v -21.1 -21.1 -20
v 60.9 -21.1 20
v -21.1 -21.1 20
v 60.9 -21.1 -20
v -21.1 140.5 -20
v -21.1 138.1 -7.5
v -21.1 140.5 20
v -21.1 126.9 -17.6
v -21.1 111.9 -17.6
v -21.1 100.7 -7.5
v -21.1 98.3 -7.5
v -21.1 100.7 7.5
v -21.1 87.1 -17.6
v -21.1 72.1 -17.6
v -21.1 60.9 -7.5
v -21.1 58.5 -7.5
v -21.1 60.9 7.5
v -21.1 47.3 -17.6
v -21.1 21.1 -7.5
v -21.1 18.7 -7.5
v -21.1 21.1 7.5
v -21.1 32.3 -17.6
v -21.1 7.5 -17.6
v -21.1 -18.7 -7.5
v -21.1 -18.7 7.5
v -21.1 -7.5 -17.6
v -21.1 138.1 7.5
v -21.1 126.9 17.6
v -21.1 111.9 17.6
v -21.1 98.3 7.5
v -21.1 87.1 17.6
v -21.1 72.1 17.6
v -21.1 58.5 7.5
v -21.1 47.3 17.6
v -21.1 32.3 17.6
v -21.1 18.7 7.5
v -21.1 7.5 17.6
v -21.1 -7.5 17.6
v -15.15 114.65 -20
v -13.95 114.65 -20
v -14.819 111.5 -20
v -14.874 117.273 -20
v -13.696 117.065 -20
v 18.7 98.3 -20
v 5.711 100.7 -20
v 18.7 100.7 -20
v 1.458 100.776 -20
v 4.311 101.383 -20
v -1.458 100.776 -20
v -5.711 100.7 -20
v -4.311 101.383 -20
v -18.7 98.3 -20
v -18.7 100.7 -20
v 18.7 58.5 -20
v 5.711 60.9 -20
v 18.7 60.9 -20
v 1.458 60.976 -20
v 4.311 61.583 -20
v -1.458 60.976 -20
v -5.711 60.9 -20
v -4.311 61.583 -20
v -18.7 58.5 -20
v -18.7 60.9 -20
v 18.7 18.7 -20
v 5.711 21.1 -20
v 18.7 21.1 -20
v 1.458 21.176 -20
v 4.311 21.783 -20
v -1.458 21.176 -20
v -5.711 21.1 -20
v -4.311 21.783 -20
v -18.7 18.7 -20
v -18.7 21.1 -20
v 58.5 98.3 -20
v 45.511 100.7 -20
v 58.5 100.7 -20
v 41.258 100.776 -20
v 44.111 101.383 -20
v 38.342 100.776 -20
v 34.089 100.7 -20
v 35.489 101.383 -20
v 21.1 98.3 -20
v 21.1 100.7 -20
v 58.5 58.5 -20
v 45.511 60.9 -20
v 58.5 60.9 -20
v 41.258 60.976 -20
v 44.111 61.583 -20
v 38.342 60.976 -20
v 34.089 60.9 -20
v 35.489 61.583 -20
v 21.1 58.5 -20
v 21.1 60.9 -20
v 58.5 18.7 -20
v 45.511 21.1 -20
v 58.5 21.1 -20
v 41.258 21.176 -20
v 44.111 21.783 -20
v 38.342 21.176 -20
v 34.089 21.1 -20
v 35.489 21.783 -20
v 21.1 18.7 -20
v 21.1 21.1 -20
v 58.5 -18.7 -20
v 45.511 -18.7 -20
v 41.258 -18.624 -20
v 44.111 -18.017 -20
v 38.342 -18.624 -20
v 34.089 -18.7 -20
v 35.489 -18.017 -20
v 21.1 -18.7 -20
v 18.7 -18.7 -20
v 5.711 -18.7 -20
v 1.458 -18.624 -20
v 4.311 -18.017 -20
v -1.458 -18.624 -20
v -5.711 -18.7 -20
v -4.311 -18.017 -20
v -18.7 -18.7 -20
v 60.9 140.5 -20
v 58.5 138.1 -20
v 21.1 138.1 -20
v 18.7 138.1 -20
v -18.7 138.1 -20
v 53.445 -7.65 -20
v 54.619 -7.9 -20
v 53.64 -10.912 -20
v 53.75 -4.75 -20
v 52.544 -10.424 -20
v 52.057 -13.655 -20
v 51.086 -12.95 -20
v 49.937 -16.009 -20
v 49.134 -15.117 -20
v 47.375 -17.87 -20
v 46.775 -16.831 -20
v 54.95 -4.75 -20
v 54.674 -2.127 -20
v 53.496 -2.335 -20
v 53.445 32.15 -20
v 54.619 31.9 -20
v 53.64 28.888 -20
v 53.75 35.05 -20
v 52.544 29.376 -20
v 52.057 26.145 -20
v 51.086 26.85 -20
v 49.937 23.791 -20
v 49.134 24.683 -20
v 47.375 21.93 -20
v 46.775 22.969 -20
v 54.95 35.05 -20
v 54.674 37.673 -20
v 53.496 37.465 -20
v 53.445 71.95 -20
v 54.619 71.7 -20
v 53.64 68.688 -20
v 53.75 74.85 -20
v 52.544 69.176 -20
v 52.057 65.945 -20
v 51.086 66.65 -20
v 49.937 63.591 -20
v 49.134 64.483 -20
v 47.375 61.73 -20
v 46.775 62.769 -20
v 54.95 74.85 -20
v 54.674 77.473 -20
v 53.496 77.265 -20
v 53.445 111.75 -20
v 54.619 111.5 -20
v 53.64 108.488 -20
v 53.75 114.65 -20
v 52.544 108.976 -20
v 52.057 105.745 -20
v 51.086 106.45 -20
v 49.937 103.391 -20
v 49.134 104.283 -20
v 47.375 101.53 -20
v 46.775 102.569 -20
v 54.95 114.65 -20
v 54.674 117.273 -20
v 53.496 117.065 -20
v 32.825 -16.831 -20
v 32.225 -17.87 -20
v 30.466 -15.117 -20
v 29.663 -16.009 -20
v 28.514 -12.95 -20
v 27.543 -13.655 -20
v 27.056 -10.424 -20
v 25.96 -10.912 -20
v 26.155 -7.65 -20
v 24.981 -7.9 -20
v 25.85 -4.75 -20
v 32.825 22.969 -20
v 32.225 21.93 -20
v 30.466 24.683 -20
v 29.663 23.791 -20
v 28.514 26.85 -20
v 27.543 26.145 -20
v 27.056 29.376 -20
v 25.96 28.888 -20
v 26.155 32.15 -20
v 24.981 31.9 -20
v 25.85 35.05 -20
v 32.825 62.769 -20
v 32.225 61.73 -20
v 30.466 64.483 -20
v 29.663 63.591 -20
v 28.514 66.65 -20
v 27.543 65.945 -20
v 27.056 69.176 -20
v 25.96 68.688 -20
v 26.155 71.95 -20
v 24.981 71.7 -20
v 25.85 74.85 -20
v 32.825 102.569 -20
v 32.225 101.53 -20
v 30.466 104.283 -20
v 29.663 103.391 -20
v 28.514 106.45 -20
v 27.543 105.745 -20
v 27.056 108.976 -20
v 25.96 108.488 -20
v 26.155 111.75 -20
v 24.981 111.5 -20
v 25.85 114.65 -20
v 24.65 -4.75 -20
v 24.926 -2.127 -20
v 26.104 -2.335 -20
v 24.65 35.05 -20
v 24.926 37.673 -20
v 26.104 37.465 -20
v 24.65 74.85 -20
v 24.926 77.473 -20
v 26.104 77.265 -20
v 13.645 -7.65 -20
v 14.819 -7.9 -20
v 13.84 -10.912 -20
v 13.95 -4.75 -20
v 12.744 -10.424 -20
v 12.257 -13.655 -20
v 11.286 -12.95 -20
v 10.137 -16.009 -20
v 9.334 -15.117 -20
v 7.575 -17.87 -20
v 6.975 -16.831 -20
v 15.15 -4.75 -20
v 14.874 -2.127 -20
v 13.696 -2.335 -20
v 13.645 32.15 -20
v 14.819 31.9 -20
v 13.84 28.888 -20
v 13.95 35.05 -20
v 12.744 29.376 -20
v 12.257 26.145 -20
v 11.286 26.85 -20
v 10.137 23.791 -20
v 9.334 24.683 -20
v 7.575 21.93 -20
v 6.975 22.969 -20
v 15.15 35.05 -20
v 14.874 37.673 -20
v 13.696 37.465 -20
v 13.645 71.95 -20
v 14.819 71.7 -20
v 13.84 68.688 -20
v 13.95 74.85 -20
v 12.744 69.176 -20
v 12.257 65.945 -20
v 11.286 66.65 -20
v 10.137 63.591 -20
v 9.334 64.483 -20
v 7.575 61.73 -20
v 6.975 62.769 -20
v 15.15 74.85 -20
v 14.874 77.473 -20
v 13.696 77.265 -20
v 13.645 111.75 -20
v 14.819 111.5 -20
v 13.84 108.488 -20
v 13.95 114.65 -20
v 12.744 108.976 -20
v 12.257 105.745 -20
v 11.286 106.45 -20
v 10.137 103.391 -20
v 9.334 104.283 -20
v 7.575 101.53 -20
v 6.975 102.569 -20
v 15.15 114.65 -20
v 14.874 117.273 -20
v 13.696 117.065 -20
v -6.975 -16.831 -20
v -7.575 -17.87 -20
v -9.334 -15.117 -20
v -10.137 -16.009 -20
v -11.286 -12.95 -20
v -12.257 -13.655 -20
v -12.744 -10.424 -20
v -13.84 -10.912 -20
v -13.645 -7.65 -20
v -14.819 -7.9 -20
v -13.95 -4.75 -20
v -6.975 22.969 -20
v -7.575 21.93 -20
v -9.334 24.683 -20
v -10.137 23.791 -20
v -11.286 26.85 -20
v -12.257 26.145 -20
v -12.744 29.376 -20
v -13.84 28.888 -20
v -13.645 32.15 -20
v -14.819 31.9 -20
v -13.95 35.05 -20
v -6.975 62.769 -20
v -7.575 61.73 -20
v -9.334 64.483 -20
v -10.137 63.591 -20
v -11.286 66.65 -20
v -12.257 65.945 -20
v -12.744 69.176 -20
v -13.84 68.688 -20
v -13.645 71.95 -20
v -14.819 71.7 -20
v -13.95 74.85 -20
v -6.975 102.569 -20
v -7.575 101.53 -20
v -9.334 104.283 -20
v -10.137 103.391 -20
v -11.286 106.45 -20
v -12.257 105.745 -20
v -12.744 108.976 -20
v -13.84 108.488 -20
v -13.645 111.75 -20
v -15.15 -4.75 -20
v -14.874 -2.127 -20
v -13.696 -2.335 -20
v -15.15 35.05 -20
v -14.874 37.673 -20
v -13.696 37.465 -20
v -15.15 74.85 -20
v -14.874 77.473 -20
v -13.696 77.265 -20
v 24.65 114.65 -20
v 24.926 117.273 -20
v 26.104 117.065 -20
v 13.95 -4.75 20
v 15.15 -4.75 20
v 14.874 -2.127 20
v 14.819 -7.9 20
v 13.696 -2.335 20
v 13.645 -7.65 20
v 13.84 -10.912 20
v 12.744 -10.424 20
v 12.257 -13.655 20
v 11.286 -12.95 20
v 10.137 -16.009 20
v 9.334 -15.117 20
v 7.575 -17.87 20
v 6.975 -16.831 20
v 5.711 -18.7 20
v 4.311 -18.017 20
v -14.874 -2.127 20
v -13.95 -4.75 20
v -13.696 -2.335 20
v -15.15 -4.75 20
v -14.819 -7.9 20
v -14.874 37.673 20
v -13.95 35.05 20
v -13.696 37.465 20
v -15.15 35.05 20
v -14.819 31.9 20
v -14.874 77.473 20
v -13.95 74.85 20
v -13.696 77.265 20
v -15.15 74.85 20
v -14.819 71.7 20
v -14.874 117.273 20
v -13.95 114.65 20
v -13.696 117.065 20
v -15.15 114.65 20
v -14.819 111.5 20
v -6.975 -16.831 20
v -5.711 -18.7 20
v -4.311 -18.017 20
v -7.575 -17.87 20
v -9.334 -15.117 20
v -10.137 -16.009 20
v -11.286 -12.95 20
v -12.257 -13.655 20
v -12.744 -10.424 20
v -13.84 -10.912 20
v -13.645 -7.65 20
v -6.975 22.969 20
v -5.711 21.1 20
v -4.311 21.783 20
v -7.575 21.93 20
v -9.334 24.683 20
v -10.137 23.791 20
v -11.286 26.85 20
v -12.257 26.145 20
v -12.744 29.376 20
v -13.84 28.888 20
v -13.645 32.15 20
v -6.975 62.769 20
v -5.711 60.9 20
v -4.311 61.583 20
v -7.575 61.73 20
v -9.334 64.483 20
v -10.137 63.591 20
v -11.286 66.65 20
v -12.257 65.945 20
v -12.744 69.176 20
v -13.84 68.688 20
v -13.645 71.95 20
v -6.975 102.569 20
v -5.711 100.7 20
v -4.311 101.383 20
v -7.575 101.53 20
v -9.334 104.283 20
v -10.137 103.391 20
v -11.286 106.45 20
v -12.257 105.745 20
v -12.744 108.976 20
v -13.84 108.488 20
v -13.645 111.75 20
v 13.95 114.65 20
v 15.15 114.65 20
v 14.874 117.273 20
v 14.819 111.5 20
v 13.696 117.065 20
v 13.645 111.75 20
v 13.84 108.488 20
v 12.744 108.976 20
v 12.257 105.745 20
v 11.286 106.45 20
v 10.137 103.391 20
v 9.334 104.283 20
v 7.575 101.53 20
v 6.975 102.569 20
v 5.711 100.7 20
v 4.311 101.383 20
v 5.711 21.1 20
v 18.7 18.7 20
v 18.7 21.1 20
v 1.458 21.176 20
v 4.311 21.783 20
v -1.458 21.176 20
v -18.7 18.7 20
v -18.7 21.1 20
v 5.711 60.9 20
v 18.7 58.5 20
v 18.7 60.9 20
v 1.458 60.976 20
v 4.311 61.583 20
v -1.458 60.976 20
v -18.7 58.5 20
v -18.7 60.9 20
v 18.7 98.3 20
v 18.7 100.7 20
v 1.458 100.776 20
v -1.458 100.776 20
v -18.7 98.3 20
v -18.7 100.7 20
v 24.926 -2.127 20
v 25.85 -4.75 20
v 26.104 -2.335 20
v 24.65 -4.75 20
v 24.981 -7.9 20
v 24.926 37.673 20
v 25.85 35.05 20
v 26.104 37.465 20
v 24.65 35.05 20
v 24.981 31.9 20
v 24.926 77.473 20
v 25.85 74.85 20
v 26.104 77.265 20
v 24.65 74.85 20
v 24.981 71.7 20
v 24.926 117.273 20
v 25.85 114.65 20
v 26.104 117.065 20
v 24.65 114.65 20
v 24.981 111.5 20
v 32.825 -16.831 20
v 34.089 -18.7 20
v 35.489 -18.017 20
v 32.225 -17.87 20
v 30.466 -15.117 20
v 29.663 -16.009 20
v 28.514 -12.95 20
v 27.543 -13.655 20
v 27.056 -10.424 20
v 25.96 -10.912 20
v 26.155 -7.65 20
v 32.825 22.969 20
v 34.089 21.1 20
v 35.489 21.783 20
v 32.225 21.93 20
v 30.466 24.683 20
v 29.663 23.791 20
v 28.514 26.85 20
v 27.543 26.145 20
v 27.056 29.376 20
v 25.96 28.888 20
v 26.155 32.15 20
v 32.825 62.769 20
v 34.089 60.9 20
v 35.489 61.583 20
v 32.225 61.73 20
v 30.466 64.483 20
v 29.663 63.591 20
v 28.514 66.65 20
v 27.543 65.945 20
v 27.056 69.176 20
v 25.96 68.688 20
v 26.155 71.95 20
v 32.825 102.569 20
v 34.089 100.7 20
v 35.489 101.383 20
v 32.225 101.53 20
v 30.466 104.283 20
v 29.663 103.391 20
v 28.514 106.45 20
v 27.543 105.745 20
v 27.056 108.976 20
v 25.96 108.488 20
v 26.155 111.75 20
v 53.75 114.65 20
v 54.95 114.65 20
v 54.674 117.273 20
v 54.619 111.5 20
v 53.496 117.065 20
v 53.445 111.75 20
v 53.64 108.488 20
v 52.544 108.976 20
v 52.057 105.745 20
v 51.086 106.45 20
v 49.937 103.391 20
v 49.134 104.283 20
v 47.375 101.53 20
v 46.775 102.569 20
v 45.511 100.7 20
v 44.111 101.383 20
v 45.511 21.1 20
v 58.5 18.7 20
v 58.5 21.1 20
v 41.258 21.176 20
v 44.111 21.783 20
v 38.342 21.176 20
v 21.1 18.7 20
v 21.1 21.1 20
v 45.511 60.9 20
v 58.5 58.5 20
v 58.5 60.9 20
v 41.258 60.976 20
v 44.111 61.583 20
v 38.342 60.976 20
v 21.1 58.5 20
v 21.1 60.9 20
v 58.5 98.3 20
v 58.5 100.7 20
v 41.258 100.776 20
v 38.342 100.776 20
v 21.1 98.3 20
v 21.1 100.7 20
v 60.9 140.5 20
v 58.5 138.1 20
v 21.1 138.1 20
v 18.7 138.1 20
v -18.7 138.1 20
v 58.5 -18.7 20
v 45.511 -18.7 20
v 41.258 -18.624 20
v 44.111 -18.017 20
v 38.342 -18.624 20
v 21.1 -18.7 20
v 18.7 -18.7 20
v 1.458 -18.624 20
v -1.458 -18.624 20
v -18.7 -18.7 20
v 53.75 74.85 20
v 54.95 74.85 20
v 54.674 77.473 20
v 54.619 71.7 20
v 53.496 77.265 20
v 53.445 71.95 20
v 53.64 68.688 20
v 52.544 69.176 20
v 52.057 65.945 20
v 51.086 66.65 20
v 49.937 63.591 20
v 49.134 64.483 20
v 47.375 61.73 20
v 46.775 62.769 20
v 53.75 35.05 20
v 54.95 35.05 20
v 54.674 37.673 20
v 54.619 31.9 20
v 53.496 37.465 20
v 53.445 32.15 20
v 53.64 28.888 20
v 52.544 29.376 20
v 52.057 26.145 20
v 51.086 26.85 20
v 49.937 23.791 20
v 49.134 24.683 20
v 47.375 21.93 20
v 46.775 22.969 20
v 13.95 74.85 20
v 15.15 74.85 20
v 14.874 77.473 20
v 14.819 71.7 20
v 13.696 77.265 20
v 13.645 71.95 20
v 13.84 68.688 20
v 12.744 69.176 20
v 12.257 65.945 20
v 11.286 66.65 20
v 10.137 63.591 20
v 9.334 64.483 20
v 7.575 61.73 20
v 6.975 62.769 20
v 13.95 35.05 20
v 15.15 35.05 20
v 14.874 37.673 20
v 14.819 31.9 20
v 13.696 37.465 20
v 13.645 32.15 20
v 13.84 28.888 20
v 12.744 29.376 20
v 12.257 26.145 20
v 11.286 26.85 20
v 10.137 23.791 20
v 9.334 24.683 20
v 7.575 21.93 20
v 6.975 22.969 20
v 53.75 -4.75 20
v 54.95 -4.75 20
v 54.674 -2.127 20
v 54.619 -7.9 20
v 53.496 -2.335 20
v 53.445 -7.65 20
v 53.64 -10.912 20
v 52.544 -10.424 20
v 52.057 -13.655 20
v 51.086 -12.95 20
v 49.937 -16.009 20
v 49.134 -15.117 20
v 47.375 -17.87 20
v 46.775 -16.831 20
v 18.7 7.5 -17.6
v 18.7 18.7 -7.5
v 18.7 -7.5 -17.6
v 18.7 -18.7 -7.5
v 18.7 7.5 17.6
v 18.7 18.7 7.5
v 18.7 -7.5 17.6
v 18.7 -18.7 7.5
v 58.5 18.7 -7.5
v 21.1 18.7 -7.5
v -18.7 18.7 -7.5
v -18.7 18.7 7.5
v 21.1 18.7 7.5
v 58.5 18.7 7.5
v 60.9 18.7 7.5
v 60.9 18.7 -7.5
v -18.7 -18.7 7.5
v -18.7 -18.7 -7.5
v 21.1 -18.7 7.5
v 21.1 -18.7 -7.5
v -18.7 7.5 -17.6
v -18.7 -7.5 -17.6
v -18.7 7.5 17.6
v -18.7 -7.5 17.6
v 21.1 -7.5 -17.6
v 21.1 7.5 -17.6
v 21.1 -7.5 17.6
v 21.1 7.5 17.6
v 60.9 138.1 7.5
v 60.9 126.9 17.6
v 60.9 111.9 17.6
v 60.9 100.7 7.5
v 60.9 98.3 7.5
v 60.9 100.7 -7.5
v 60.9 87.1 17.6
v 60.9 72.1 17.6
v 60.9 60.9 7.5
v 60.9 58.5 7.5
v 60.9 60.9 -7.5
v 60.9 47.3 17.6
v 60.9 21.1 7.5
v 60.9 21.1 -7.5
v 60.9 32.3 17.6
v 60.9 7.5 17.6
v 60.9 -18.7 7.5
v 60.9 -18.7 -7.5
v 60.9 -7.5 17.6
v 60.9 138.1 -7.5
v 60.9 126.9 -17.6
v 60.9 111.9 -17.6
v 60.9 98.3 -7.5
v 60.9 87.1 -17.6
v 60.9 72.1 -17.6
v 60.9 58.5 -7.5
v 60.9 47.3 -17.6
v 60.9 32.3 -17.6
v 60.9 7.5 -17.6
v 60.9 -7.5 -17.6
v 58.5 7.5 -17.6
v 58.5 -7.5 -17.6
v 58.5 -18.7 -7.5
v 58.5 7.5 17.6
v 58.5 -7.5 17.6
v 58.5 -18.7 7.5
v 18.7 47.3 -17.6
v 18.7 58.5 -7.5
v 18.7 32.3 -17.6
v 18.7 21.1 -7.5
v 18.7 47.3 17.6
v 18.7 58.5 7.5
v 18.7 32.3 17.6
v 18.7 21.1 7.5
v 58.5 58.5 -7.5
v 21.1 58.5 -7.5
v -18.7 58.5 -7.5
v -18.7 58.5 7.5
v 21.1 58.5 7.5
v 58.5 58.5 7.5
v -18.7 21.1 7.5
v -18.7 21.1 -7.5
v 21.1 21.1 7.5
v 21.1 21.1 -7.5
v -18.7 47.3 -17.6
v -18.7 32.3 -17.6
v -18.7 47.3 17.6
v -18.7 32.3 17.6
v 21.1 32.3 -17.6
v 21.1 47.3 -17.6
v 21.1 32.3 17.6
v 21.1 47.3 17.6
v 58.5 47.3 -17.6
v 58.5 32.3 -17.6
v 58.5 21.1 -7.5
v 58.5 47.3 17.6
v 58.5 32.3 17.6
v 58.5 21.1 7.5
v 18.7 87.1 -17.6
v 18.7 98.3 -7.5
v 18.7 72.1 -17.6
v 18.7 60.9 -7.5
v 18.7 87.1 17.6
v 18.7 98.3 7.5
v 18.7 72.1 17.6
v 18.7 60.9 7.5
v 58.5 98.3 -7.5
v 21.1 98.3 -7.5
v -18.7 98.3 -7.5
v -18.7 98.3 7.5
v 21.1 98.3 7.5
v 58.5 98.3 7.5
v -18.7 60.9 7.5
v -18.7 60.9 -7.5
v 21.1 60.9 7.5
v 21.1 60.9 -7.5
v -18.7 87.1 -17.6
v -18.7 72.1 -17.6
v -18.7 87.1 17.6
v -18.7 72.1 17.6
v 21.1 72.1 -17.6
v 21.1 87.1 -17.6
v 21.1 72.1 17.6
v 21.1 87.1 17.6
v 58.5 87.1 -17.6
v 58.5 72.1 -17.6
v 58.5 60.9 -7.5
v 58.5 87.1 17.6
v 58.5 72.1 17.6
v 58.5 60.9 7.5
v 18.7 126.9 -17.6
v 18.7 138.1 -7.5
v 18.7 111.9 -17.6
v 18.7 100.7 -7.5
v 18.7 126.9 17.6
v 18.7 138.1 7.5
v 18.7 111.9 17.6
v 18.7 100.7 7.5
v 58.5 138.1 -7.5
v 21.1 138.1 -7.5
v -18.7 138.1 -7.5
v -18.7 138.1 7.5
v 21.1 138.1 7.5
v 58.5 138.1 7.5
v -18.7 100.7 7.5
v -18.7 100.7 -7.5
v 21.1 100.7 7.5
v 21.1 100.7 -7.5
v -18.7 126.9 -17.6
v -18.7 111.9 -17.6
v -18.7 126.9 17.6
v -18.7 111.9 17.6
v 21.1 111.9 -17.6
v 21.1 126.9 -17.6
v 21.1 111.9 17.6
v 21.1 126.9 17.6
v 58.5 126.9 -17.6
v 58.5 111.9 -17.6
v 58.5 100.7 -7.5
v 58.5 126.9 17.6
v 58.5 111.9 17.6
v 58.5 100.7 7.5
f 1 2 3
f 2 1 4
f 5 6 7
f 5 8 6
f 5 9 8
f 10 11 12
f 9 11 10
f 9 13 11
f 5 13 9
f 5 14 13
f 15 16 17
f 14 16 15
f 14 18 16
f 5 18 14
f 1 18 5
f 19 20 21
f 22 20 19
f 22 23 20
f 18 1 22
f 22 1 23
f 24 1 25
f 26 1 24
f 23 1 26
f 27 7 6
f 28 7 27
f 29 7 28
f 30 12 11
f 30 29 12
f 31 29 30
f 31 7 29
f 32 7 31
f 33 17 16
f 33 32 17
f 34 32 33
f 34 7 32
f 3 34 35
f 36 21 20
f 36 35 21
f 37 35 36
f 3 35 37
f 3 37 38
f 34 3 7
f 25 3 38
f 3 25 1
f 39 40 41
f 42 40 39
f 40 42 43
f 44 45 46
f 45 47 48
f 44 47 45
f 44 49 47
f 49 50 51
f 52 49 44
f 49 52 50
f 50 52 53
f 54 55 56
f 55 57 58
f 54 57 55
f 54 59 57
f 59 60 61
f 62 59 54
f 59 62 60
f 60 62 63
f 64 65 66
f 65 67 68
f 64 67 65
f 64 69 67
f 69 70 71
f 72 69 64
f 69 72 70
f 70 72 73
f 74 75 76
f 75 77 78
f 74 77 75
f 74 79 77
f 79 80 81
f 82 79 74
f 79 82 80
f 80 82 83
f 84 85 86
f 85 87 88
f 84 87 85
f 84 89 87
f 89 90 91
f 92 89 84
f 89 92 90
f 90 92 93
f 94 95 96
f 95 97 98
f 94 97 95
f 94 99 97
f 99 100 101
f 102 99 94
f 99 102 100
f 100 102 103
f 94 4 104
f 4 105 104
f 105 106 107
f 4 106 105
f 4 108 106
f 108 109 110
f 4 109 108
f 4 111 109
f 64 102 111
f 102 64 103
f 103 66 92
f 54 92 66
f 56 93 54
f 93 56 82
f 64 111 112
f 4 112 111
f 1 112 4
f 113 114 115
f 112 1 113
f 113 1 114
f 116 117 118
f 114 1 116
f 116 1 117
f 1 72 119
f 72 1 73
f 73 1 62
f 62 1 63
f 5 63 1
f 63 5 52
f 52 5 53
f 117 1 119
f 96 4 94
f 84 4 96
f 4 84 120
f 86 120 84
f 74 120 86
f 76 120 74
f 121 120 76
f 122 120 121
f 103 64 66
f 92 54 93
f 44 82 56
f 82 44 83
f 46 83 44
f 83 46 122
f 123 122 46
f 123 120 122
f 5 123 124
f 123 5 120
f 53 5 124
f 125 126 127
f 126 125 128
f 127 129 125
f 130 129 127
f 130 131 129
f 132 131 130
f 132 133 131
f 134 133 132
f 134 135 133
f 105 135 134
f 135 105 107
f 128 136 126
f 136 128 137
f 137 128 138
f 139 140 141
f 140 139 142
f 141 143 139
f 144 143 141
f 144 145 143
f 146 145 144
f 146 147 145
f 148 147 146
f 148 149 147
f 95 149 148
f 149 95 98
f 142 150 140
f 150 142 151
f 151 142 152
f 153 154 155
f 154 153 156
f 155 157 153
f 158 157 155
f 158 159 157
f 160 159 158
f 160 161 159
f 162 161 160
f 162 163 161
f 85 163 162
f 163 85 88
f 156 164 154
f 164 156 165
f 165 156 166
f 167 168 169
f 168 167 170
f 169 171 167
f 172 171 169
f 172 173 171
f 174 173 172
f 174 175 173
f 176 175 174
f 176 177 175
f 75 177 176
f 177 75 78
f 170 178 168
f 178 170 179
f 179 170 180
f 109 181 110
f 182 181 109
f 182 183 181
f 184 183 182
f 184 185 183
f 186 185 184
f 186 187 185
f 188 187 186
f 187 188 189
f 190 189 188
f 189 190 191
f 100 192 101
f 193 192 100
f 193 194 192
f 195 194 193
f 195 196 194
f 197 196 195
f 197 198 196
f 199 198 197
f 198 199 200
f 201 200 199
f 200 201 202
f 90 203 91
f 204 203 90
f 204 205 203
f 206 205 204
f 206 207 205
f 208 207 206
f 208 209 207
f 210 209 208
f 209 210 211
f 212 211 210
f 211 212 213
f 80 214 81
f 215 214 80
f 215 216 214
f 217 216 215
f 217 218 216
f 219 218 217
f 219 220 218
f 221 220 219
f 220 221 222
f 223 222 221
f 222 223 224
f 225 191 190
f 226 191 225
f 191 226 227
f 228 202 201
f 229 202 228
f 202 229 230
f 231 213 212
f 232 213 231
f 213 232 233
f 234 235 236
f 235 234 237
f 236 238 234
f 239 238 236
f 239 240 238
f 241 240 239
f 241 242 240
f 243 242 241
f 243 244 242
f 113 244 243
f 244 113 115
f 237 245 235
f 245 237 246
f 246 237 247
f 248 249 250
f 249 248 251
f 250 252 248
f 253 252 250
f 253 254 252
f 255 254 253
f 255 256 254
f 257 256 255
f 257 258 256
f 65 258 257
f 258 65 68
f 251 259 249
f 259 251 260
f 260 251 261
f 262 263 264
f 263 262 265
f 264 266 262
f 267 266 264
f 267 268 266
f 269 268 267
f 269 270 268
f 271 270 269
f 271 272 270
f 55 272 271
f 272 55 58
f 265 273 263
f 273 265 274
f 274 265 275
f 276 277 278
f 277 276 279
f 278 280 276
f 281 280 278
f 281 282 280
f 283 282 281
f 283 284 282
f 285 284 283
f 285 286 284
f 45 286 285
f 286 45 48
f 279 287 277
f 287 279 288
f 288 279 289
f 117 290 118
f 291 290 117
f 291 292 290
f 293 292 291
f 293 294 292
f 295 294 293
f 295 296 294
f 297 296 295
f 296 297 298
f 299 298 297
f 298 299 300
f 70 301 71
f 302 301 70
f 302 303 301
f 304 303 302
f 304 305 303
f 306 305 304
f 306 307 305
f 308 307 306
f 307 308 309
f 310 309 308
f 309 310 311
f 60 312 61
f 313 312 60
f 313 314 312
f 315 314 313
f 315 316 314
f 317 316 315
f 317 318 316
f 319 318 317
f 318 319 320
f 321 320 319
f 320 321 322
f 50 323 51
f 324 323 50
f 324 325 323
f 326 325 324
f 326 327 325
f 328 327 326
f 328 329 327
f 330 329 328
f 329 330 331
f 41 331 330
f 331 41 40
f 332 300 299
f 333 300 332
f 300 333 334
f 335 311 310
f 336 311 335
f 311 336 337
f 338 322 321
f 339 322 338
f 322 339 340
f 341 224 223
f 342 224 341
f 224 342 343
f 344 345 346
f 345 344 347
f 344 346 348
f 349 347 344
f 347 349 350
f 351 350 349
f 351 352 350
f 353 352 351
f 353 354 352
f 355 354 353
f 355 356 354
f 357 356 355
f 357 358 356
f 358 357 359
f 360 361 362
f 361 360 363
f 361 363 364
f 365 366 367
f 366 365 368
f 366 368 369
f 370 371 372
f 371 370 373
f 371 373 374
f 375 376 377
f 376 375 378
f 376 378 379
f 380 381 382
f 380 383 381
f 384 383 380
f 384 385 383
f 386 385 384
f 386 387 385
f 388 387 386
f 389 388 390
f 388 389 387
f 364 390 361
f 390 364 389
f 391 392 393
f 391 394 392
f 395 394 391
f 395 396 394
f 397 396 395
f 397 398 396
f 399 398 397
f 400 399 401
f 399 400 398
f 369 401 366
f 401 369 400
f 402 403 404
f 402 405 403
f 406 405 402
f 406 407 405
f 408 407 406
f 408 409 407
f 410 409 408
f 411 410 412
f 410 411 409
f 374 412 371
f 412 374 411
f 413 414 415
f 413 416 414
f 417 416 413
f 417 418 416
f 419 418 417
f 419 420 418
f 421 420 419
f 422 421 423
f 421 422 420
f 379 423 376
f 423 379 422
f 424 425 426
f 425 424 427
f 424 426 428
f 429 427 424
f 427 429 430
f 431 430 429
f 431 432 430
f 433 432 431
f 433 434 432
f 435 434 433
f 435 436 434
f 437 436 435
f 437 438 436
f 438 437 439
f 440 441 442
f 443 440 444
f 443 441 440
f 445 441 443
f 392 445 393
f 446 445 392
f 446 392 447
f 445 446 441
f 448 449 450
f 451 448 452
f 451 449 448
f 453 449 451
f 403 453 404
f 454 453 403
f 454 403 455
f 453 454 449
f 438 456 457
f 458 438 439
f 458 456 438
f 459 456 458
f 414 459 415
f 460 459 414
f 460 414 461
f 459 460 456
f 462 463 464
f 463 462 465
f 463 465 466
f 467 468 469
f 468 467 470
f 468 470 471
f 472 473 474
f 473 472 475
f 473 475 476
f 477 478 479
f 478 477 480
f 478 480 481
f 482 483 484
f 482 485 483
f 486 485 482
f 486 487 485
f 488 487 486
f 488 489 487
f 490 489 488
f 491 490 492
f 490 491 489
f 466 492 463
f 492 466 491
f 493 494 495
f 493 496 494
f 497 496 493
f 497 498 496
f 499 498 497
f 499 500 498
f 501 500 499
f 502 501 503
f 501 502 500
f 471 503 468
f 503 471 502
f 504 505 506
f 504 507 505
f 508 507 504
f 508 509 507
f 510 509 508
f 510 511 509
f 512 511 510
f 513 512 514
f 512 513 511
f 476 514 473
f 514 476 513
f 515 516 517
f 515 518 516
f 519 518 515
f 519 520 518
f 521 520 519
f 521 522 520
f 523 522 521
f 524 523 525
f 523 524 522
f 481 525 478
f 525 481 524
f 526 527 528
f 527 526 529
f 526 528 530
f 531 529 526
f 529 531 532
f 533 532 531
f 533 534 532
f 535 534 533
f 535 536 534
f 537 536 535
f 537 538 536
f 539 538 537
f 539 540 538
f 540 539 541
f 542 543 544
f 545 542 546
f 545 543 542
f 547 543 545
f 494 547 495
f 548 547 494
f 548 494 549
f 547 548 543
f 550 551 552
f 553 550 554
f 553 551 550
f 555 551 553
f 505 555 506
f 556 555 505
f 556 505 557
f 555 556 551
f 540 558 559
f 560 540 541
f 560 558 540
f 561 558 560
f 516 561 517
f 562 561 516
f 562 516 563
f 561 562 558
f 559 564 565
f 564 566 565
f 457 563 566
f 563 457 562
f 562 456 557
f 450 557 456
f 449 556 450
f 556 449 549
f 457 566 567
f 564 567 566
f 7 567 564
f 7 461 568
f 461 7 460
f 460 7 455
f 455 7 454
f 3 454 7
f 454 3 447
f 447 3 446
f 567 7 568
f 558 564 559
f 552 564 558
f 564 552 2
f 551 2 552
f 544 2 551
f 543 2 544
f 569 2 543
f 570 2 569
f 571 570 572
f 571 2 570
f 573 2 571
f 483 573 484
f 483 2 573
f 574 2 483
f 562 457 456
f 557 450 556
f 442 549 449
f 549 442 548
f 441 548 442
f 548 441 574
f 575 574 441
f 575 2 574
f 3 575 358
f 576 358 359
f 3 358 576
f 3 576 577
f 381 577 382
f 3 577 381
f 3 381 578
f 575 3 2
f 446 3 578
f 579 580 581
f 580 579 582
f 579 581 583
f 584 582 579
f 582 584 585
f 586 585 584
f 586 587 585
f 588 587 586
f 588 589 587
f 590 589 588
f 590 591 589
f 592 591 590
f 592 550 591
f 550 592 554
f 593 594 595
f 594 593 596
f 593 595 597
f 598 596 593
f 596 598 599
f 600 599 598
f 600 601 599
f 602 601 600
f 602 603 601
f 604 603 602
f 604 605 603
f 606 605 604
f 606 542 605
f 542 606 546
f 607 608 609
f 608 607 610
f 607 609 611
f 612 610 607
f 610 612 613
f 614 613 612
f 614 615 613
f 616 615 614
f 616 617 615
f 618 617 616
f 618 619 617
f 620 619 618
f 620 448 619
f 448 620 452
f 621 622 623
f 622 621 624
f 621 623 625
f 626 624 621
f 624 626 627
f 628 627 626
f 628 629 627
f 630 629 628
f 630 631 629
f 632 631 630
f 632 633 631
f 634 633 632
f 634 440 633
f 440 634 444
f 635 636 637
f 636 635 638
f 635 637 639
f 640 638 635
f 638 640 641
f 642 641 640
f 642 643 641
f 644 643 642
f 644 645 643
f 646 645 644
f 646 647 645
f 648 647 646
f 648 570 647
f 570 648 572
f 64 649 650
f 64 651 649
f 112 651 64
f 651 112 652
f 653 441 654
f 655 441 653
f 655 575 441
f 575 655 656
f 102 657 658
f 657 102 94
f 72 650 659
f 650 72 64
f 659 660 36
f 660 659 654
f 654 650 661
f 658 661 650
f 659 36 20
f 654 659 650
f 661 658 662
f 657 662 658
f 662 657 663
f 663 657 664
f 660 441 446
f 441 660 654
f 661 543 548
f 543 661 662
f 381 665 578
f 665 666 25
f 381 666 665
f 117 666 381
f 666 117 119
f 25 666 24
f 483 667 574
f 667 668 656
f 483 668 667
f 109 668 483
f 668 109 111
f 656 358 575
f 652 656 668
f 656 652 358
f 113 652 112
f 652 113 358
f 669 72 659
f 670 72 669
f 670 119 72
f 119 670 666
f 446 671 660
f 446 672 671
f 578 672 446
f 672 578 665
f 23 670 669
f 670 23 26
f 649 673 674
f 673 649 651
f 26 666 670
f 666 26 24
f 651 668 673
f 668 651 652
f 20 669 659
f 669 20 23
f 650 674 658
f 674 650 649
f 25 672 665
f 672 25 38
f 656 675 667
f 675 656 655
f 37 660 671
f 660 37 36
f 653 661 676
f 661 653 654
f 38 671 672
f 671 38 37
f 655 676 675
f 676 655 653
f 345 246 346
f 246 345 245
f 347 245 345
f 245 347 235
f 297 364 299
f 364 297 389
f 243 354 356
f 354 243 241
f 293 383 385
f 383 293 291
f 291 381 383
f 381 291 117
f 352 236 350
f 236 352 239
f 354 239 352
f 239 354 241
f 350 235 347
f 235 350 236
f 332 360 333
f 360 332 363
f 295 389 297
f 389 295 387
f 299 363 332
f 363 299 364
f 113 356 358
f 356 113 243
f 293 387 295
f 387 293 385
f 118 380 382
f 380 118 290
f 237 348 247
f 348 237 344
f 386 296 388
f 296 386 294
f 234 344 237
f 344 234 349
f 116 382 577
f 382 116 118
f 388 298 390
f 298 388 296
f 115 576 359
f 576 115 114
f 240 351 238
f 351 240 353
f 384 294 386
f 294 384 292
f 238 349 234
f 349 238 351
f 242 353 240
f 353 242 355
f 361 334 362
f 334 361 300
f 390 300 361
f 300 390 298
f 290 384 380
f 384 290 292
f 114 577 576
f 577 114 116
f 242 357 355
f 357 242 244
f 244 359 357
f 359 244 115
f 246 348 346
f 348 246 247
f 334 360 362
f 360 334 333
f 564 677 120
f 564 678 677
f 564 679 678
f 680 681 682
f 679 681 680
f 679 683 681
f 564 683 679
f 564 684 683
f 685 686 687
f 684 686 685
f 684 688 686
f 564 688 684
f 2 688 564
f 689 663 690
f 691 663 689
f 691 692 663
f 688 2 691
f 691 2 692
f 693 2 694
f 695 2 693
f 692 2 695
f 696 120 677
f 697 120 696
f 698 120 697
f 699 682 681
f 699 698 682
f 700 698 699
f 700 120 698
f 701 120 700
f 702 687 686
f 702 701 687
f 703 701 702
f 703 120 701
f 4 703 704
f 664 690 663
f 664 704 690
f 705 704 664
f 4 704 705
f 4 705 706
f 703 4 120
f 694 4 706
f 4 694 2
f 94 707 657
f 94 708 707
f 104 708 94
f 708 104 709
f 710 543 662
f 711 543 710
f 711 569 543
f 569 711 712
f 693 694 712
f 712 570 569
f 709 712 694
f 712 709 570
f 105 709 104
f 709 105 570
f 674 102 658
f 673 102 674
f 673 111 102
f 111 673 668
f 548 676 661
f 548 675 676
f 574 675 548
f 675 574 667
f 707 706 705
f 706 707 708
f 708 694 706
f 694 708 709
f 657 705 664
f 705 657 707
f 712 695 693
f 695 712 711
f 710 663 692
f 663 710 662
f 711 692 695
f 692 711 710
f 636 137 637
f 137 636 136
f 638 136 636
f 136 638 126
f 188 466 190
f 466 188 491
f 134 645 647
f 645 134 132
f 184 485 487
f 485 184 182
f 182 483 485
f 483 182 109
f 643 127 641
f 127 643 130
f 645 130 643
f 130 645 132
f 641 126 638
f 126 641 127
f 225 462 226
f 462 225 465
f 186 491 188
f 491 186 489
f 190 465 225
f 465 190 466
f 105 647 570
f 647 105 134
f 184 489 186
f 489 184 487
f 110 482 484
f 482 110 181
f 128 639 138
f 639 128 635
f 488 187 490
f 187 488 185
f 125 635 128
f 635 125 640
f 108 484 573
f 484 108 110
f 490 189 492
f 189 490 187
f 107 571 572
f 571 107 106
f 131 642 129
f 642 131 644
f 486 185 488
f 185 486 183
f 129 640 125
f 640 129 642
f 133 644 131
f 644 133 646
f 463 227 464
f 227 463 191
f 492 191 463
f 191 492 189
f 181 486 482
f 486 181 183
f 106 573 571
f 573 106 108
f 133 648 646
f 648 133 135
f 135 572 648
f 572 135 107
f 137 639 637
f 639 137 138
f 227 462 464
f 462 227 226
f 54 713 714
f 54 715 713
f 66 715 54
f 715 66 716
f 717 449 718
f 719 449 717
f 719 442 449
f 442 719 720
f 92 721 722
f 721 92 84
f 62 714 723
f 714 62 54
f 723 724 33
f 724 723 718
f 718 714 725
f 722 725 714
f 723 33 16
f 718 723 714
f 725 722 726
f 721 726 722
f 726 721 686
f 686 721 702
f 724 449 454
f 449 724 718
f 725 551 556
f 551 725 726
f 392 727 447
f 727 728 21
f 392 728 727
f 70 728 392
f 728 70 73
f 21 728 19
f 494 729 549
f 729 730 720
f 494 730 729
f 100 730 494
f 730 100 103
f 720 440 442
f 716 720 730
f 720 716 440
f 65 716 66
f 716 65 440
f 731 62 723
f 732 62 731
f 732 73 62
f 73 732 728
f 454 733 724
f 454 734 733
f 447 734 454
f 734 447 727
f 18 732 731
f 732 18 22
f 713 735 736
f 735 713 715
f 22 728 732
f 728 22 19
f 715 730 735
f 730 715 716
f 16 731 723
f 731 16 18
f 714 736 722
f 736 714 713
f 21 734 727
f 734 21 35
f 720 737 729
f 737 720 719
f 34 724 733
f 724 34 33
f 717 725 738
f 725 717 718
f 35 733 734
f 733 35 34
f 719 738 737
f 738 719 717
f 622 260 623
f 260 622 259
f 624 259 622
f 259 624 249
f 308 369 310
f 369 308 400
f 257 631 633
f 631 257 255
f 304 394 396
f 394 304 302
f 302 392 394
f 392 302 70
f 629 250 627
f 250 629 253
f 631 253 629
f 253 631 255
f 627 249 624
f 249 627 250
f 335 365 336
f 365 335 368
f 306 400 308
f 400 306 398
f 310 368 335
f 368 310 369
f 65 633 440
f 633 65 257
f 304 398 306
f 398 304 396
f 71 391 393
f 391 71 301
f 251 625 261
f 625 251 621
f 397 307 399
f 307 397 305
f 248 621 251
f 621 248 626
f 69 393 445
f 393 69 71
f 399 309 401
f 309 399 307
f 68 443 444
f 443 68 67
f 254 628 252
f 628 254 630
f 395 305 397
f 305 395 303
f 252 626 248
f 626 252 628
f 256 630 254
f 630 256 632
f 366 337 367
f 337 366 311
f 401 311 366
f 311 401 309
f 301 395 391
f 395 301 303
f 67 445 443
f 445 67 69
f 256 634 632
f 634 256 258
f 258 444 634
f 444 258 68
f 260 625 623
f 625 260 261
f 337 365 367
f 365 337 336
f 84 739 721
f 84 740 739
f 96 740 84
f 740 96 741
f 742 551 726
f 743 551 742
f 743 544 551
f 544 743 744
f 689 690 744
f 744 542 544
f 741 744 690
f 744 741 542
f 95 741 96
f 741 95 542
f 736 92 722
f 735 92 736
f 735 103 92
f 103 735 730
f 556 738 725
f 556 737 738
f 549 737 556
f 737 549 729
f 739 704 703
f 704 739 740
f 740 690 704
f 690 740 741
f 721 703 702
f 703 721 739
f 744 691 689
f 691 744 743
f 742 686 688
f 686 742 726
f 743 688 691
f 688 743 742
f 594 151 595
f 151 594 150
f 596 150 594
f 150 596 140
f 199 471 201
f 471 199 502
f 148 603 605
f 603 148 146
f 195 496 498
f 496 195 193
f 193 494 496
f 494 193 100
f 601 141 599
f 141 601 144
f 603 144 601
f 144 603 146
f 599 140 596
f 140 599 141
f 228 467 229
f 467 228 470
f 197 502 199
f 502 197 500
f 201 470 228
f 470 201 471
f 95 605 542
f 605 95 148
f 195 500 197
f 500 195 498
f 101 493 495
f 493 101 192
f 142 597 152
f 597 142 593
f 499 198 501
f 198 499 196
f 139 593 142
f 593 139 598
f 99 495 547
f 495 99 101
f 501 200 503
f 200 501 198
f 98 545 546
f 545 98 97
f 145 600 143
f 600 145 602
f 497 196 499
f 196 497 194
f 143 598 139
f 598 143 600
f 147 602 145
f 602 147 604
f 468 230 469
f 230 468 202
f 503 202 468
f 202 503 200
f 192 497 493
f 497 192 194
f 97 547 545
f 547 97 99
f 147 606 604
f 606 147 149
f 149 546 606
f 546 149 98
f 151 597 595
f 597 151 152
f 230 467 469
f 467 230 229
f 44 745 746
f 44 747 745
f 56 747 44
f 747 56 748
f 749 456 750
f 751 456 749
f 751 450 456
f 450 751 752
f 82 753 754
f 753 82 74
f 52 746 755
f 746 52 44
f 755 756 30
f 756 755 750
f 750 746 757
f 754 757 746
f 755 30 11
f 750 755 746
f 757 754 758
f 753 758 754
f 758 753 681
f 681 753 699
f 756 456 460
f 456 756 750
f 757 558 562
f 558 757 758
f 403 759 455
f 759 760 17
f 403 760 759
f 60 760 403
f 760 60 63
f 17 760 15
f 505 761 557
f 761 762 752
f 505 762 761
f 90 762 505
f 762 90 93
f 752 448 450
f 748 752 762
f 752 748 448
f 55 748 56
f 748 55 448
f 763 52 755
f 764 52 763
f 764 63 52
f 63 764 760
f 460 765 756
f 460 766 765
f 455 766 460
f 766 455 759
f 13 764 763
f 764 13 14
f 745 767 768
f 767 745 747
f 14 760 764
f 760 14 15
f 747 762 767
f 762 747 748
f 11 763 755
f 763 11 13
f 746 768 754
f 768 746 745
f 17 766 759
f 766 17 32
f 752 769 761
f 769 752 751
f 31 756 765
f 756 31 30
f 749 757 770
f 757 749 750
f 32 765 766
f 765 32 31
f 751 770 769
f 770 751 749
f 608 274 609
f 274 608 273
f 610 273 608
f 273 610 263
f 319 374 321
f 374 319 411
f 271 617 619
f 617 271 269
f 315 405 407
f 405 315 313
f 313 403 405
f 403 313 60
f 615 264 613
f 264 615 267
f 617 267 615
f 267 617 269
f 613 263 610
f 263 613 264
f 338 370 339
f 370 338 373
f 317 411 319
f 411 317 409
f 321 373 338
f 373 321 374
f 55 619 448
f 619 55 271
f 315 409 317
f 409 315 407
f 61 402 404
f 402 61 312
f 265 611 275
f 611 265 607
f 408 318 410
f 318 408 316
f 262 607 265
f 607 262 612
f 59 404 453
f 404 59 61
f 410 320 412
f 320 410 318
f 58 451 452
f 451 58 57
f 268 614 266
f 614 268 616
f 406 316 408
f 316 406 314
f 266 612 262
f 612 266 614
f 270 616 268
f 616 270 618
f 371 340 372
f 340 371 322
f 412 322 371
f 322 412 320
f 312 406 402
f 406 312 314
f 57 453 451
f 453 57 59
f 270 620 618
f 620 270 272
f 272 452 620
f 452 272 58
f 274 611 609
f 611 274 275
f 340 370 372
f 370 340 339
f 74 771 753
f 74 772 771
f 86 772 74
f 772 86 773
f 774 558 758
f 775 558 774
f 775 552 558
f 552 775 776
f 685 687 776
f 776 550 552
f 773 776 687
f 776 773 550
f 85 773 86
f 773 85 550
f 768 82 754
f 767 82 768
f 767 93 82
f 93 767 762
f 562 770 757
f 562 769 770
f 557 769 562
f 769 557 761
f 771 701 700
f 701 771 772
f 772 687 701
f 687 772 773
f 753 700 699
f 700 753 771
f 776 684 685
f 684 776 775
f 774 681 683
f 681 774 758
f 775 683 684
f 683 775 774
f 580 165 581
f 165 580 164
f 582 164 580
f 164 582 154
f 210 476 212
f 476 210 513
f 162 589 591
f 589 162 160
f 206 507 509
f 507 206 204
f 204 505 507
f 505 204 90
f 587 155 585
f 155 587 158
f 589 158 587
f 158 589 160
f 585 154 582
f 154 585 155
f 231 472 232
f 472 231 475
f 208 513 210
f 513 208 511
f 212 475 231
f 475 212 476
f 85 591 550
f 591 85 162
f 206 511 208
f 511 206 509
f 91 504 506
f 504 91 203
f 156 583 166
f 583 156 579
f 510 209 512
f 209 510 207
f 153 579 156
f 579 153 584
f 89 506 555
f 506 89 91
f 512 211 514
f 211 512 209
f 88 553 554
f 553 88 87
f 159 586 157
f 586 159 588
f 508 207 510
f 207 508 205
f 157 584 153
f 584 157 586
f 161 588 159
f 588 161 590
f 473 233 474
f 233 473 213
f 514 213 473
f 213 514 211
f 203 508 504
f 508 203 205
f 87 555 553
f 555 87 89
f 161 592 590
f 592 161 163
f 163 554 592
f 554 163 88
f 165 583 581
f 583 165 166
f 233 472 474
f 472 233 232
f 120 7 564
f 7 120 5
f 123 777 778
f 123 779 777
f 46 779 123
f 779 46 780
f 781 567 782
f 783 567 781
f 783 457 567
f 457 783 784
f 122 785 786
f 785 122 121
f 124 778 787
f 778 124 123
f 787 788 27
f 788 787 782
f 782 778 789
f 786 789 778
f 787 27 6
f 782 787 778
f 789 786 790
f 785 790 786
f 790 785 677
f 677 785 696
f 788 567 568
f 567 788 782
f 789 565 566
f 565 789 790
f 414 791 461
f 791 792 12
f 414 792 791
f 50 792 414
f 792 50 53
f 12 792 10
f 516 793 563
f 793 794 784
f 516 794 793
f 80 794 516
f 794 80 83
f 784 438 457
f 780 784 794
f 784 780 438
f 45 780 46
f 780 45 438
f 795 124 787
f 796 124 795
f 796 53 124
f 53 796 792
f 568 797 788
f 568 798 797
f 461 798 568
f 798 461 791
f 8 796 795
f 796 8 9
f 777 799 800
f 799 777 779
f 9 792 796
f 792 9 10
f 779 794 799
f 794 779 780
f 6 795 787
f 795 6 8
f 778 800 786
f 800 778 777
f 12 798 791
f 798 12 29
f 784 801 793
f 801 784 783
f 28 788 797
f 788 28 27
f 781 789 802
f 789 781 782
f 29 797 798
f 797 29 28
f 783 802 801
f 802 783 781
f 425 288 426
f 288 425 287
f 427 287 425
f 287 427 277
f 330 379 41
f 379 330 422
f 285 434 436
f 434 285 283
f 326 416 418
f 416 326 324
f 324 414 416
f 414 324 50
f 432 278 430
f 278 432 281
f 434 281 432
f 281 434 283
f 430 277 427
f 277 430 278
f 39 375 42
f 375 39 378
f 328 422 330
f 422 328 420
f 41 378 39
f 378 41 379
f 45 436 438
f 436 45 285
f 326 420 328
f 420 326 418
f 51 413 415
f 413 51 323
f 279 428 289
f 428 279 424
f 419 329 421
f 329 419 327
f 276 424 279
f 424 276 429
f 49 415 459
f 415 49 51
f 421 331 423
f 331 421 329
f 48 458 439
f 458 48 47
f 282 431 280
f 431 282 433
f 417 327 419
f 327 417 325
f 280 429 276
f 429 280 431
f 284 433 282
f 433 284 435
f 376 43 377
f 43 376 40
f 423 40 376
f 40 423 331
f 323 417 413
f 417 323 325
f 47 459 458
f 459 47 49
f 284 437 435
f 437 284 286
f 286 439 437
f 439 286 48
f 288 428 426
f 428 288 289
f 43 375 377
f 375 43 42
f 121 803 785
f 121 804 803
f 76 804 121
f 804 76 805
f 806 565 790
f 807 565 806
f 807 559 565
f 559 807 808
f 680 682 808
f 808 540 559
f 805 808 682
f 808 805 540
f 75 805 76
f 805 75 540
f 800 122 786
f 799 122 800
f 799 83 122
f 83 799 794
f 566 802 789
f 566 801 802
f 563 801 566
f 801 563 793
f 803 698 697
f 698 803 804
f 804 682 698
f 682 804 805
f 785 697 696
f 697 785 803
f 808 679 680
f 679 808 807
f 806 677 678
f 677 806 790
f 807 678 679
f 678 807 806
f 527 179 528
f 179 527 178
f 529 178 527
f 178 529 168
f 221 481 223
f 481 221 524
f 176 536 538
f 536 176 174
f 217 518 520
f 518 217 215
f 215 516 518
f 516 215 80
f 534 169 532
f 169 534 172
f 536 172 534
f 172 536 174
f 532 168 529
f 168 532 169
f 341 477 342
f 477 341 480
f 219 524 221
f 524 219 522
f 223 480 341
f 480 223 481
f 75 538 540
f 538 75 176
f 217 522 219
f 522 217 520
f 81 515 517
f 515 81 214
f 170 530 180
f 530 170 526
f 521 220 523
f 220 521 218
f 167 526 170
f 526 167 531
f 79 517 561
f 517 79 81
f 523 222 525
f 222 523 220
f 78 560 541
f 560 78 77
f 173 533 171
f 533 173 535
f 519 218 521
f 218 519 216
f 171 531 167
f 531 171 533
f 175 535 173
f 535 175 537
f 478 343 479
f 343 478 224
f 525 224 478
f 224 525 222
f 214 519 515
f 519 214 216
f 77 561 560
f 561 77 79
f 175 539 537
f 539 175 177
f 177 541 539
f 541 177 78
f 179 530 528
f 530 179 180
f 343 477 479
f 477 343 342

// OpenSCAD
rows = 4; // [1:1:20]
columns = 2; // [1:1:20]

rollDiameter = 31; // [1:1:60]
rollHeight = 52; // [1:1:100]

wallThickness = 2.4; // [0.1:0.1:4]
maxBridge = 15; // [0:1:40]

/* [Hidden] */
holderDiameter = rollDiameter*0.9;
rackWidth = rollDiameter+4+wallThickness;
rackDepth = rollHeight-12;

module rack(wallThickness,rollDiameter,rackDepth,maxBridge,holderDiameter,rackWidth)
{
	/* STRUCTURE */
	difference()
	{
		difference()
		{
			cube([rackWidth+2*wallThickness,rackDepth,rackWidth+2*wallThickness], center=true);
			cube([rackWidth,rackDepth+wallThickness,rackWidth], center=true);
		}

		hull()
		{
			cube([rackWidth+4*wallThickness,maxBridge,rackWidth], center=true);
			cube([rackWidth+4*wallThickness,rackDepth-2*wallThickness,maxBridge], center=true);
		}
	}
	
	/* HOLDER */
	translate([0,0,holderDiameter/2-rackWidth/2])
		rotate([90,0,0])
		difference()
		{
			difference()
			{
				cylinder(h=rackDepth, d=holderDiameter+wallThickness, center=true);
				cylinder(h=rackDepth+wallThickness, d=holderDiameter, center=true);
			}

			union()
			{
				rotate([0,0,10])
					translate([0,0,-(rackDepth+4*wallThickness)/2])
					cube([rollDiameter,rollDiameter,rollHeight+4*wallThickness]);

				rotate([0,0,80])
					translate([0,0,-(rackDepth+4*wallThickness)/2])
					cube([rollDiameter,rollDiameter,rollHeight+4*wallThickness]);
			}
		}
}

rotate([-90,0,0])
{
	for(z = [0:1:(rows-1)], x = [0:1:(columns-1)])
	{
		translate([x*(rackWidth+wallThickness),0,z*(rackWidth+wallThickness)])
		rack(wallThickness,rollDiameter,rackDepth,maxBridge,holderDiameter,rackWidth);
	}
}
